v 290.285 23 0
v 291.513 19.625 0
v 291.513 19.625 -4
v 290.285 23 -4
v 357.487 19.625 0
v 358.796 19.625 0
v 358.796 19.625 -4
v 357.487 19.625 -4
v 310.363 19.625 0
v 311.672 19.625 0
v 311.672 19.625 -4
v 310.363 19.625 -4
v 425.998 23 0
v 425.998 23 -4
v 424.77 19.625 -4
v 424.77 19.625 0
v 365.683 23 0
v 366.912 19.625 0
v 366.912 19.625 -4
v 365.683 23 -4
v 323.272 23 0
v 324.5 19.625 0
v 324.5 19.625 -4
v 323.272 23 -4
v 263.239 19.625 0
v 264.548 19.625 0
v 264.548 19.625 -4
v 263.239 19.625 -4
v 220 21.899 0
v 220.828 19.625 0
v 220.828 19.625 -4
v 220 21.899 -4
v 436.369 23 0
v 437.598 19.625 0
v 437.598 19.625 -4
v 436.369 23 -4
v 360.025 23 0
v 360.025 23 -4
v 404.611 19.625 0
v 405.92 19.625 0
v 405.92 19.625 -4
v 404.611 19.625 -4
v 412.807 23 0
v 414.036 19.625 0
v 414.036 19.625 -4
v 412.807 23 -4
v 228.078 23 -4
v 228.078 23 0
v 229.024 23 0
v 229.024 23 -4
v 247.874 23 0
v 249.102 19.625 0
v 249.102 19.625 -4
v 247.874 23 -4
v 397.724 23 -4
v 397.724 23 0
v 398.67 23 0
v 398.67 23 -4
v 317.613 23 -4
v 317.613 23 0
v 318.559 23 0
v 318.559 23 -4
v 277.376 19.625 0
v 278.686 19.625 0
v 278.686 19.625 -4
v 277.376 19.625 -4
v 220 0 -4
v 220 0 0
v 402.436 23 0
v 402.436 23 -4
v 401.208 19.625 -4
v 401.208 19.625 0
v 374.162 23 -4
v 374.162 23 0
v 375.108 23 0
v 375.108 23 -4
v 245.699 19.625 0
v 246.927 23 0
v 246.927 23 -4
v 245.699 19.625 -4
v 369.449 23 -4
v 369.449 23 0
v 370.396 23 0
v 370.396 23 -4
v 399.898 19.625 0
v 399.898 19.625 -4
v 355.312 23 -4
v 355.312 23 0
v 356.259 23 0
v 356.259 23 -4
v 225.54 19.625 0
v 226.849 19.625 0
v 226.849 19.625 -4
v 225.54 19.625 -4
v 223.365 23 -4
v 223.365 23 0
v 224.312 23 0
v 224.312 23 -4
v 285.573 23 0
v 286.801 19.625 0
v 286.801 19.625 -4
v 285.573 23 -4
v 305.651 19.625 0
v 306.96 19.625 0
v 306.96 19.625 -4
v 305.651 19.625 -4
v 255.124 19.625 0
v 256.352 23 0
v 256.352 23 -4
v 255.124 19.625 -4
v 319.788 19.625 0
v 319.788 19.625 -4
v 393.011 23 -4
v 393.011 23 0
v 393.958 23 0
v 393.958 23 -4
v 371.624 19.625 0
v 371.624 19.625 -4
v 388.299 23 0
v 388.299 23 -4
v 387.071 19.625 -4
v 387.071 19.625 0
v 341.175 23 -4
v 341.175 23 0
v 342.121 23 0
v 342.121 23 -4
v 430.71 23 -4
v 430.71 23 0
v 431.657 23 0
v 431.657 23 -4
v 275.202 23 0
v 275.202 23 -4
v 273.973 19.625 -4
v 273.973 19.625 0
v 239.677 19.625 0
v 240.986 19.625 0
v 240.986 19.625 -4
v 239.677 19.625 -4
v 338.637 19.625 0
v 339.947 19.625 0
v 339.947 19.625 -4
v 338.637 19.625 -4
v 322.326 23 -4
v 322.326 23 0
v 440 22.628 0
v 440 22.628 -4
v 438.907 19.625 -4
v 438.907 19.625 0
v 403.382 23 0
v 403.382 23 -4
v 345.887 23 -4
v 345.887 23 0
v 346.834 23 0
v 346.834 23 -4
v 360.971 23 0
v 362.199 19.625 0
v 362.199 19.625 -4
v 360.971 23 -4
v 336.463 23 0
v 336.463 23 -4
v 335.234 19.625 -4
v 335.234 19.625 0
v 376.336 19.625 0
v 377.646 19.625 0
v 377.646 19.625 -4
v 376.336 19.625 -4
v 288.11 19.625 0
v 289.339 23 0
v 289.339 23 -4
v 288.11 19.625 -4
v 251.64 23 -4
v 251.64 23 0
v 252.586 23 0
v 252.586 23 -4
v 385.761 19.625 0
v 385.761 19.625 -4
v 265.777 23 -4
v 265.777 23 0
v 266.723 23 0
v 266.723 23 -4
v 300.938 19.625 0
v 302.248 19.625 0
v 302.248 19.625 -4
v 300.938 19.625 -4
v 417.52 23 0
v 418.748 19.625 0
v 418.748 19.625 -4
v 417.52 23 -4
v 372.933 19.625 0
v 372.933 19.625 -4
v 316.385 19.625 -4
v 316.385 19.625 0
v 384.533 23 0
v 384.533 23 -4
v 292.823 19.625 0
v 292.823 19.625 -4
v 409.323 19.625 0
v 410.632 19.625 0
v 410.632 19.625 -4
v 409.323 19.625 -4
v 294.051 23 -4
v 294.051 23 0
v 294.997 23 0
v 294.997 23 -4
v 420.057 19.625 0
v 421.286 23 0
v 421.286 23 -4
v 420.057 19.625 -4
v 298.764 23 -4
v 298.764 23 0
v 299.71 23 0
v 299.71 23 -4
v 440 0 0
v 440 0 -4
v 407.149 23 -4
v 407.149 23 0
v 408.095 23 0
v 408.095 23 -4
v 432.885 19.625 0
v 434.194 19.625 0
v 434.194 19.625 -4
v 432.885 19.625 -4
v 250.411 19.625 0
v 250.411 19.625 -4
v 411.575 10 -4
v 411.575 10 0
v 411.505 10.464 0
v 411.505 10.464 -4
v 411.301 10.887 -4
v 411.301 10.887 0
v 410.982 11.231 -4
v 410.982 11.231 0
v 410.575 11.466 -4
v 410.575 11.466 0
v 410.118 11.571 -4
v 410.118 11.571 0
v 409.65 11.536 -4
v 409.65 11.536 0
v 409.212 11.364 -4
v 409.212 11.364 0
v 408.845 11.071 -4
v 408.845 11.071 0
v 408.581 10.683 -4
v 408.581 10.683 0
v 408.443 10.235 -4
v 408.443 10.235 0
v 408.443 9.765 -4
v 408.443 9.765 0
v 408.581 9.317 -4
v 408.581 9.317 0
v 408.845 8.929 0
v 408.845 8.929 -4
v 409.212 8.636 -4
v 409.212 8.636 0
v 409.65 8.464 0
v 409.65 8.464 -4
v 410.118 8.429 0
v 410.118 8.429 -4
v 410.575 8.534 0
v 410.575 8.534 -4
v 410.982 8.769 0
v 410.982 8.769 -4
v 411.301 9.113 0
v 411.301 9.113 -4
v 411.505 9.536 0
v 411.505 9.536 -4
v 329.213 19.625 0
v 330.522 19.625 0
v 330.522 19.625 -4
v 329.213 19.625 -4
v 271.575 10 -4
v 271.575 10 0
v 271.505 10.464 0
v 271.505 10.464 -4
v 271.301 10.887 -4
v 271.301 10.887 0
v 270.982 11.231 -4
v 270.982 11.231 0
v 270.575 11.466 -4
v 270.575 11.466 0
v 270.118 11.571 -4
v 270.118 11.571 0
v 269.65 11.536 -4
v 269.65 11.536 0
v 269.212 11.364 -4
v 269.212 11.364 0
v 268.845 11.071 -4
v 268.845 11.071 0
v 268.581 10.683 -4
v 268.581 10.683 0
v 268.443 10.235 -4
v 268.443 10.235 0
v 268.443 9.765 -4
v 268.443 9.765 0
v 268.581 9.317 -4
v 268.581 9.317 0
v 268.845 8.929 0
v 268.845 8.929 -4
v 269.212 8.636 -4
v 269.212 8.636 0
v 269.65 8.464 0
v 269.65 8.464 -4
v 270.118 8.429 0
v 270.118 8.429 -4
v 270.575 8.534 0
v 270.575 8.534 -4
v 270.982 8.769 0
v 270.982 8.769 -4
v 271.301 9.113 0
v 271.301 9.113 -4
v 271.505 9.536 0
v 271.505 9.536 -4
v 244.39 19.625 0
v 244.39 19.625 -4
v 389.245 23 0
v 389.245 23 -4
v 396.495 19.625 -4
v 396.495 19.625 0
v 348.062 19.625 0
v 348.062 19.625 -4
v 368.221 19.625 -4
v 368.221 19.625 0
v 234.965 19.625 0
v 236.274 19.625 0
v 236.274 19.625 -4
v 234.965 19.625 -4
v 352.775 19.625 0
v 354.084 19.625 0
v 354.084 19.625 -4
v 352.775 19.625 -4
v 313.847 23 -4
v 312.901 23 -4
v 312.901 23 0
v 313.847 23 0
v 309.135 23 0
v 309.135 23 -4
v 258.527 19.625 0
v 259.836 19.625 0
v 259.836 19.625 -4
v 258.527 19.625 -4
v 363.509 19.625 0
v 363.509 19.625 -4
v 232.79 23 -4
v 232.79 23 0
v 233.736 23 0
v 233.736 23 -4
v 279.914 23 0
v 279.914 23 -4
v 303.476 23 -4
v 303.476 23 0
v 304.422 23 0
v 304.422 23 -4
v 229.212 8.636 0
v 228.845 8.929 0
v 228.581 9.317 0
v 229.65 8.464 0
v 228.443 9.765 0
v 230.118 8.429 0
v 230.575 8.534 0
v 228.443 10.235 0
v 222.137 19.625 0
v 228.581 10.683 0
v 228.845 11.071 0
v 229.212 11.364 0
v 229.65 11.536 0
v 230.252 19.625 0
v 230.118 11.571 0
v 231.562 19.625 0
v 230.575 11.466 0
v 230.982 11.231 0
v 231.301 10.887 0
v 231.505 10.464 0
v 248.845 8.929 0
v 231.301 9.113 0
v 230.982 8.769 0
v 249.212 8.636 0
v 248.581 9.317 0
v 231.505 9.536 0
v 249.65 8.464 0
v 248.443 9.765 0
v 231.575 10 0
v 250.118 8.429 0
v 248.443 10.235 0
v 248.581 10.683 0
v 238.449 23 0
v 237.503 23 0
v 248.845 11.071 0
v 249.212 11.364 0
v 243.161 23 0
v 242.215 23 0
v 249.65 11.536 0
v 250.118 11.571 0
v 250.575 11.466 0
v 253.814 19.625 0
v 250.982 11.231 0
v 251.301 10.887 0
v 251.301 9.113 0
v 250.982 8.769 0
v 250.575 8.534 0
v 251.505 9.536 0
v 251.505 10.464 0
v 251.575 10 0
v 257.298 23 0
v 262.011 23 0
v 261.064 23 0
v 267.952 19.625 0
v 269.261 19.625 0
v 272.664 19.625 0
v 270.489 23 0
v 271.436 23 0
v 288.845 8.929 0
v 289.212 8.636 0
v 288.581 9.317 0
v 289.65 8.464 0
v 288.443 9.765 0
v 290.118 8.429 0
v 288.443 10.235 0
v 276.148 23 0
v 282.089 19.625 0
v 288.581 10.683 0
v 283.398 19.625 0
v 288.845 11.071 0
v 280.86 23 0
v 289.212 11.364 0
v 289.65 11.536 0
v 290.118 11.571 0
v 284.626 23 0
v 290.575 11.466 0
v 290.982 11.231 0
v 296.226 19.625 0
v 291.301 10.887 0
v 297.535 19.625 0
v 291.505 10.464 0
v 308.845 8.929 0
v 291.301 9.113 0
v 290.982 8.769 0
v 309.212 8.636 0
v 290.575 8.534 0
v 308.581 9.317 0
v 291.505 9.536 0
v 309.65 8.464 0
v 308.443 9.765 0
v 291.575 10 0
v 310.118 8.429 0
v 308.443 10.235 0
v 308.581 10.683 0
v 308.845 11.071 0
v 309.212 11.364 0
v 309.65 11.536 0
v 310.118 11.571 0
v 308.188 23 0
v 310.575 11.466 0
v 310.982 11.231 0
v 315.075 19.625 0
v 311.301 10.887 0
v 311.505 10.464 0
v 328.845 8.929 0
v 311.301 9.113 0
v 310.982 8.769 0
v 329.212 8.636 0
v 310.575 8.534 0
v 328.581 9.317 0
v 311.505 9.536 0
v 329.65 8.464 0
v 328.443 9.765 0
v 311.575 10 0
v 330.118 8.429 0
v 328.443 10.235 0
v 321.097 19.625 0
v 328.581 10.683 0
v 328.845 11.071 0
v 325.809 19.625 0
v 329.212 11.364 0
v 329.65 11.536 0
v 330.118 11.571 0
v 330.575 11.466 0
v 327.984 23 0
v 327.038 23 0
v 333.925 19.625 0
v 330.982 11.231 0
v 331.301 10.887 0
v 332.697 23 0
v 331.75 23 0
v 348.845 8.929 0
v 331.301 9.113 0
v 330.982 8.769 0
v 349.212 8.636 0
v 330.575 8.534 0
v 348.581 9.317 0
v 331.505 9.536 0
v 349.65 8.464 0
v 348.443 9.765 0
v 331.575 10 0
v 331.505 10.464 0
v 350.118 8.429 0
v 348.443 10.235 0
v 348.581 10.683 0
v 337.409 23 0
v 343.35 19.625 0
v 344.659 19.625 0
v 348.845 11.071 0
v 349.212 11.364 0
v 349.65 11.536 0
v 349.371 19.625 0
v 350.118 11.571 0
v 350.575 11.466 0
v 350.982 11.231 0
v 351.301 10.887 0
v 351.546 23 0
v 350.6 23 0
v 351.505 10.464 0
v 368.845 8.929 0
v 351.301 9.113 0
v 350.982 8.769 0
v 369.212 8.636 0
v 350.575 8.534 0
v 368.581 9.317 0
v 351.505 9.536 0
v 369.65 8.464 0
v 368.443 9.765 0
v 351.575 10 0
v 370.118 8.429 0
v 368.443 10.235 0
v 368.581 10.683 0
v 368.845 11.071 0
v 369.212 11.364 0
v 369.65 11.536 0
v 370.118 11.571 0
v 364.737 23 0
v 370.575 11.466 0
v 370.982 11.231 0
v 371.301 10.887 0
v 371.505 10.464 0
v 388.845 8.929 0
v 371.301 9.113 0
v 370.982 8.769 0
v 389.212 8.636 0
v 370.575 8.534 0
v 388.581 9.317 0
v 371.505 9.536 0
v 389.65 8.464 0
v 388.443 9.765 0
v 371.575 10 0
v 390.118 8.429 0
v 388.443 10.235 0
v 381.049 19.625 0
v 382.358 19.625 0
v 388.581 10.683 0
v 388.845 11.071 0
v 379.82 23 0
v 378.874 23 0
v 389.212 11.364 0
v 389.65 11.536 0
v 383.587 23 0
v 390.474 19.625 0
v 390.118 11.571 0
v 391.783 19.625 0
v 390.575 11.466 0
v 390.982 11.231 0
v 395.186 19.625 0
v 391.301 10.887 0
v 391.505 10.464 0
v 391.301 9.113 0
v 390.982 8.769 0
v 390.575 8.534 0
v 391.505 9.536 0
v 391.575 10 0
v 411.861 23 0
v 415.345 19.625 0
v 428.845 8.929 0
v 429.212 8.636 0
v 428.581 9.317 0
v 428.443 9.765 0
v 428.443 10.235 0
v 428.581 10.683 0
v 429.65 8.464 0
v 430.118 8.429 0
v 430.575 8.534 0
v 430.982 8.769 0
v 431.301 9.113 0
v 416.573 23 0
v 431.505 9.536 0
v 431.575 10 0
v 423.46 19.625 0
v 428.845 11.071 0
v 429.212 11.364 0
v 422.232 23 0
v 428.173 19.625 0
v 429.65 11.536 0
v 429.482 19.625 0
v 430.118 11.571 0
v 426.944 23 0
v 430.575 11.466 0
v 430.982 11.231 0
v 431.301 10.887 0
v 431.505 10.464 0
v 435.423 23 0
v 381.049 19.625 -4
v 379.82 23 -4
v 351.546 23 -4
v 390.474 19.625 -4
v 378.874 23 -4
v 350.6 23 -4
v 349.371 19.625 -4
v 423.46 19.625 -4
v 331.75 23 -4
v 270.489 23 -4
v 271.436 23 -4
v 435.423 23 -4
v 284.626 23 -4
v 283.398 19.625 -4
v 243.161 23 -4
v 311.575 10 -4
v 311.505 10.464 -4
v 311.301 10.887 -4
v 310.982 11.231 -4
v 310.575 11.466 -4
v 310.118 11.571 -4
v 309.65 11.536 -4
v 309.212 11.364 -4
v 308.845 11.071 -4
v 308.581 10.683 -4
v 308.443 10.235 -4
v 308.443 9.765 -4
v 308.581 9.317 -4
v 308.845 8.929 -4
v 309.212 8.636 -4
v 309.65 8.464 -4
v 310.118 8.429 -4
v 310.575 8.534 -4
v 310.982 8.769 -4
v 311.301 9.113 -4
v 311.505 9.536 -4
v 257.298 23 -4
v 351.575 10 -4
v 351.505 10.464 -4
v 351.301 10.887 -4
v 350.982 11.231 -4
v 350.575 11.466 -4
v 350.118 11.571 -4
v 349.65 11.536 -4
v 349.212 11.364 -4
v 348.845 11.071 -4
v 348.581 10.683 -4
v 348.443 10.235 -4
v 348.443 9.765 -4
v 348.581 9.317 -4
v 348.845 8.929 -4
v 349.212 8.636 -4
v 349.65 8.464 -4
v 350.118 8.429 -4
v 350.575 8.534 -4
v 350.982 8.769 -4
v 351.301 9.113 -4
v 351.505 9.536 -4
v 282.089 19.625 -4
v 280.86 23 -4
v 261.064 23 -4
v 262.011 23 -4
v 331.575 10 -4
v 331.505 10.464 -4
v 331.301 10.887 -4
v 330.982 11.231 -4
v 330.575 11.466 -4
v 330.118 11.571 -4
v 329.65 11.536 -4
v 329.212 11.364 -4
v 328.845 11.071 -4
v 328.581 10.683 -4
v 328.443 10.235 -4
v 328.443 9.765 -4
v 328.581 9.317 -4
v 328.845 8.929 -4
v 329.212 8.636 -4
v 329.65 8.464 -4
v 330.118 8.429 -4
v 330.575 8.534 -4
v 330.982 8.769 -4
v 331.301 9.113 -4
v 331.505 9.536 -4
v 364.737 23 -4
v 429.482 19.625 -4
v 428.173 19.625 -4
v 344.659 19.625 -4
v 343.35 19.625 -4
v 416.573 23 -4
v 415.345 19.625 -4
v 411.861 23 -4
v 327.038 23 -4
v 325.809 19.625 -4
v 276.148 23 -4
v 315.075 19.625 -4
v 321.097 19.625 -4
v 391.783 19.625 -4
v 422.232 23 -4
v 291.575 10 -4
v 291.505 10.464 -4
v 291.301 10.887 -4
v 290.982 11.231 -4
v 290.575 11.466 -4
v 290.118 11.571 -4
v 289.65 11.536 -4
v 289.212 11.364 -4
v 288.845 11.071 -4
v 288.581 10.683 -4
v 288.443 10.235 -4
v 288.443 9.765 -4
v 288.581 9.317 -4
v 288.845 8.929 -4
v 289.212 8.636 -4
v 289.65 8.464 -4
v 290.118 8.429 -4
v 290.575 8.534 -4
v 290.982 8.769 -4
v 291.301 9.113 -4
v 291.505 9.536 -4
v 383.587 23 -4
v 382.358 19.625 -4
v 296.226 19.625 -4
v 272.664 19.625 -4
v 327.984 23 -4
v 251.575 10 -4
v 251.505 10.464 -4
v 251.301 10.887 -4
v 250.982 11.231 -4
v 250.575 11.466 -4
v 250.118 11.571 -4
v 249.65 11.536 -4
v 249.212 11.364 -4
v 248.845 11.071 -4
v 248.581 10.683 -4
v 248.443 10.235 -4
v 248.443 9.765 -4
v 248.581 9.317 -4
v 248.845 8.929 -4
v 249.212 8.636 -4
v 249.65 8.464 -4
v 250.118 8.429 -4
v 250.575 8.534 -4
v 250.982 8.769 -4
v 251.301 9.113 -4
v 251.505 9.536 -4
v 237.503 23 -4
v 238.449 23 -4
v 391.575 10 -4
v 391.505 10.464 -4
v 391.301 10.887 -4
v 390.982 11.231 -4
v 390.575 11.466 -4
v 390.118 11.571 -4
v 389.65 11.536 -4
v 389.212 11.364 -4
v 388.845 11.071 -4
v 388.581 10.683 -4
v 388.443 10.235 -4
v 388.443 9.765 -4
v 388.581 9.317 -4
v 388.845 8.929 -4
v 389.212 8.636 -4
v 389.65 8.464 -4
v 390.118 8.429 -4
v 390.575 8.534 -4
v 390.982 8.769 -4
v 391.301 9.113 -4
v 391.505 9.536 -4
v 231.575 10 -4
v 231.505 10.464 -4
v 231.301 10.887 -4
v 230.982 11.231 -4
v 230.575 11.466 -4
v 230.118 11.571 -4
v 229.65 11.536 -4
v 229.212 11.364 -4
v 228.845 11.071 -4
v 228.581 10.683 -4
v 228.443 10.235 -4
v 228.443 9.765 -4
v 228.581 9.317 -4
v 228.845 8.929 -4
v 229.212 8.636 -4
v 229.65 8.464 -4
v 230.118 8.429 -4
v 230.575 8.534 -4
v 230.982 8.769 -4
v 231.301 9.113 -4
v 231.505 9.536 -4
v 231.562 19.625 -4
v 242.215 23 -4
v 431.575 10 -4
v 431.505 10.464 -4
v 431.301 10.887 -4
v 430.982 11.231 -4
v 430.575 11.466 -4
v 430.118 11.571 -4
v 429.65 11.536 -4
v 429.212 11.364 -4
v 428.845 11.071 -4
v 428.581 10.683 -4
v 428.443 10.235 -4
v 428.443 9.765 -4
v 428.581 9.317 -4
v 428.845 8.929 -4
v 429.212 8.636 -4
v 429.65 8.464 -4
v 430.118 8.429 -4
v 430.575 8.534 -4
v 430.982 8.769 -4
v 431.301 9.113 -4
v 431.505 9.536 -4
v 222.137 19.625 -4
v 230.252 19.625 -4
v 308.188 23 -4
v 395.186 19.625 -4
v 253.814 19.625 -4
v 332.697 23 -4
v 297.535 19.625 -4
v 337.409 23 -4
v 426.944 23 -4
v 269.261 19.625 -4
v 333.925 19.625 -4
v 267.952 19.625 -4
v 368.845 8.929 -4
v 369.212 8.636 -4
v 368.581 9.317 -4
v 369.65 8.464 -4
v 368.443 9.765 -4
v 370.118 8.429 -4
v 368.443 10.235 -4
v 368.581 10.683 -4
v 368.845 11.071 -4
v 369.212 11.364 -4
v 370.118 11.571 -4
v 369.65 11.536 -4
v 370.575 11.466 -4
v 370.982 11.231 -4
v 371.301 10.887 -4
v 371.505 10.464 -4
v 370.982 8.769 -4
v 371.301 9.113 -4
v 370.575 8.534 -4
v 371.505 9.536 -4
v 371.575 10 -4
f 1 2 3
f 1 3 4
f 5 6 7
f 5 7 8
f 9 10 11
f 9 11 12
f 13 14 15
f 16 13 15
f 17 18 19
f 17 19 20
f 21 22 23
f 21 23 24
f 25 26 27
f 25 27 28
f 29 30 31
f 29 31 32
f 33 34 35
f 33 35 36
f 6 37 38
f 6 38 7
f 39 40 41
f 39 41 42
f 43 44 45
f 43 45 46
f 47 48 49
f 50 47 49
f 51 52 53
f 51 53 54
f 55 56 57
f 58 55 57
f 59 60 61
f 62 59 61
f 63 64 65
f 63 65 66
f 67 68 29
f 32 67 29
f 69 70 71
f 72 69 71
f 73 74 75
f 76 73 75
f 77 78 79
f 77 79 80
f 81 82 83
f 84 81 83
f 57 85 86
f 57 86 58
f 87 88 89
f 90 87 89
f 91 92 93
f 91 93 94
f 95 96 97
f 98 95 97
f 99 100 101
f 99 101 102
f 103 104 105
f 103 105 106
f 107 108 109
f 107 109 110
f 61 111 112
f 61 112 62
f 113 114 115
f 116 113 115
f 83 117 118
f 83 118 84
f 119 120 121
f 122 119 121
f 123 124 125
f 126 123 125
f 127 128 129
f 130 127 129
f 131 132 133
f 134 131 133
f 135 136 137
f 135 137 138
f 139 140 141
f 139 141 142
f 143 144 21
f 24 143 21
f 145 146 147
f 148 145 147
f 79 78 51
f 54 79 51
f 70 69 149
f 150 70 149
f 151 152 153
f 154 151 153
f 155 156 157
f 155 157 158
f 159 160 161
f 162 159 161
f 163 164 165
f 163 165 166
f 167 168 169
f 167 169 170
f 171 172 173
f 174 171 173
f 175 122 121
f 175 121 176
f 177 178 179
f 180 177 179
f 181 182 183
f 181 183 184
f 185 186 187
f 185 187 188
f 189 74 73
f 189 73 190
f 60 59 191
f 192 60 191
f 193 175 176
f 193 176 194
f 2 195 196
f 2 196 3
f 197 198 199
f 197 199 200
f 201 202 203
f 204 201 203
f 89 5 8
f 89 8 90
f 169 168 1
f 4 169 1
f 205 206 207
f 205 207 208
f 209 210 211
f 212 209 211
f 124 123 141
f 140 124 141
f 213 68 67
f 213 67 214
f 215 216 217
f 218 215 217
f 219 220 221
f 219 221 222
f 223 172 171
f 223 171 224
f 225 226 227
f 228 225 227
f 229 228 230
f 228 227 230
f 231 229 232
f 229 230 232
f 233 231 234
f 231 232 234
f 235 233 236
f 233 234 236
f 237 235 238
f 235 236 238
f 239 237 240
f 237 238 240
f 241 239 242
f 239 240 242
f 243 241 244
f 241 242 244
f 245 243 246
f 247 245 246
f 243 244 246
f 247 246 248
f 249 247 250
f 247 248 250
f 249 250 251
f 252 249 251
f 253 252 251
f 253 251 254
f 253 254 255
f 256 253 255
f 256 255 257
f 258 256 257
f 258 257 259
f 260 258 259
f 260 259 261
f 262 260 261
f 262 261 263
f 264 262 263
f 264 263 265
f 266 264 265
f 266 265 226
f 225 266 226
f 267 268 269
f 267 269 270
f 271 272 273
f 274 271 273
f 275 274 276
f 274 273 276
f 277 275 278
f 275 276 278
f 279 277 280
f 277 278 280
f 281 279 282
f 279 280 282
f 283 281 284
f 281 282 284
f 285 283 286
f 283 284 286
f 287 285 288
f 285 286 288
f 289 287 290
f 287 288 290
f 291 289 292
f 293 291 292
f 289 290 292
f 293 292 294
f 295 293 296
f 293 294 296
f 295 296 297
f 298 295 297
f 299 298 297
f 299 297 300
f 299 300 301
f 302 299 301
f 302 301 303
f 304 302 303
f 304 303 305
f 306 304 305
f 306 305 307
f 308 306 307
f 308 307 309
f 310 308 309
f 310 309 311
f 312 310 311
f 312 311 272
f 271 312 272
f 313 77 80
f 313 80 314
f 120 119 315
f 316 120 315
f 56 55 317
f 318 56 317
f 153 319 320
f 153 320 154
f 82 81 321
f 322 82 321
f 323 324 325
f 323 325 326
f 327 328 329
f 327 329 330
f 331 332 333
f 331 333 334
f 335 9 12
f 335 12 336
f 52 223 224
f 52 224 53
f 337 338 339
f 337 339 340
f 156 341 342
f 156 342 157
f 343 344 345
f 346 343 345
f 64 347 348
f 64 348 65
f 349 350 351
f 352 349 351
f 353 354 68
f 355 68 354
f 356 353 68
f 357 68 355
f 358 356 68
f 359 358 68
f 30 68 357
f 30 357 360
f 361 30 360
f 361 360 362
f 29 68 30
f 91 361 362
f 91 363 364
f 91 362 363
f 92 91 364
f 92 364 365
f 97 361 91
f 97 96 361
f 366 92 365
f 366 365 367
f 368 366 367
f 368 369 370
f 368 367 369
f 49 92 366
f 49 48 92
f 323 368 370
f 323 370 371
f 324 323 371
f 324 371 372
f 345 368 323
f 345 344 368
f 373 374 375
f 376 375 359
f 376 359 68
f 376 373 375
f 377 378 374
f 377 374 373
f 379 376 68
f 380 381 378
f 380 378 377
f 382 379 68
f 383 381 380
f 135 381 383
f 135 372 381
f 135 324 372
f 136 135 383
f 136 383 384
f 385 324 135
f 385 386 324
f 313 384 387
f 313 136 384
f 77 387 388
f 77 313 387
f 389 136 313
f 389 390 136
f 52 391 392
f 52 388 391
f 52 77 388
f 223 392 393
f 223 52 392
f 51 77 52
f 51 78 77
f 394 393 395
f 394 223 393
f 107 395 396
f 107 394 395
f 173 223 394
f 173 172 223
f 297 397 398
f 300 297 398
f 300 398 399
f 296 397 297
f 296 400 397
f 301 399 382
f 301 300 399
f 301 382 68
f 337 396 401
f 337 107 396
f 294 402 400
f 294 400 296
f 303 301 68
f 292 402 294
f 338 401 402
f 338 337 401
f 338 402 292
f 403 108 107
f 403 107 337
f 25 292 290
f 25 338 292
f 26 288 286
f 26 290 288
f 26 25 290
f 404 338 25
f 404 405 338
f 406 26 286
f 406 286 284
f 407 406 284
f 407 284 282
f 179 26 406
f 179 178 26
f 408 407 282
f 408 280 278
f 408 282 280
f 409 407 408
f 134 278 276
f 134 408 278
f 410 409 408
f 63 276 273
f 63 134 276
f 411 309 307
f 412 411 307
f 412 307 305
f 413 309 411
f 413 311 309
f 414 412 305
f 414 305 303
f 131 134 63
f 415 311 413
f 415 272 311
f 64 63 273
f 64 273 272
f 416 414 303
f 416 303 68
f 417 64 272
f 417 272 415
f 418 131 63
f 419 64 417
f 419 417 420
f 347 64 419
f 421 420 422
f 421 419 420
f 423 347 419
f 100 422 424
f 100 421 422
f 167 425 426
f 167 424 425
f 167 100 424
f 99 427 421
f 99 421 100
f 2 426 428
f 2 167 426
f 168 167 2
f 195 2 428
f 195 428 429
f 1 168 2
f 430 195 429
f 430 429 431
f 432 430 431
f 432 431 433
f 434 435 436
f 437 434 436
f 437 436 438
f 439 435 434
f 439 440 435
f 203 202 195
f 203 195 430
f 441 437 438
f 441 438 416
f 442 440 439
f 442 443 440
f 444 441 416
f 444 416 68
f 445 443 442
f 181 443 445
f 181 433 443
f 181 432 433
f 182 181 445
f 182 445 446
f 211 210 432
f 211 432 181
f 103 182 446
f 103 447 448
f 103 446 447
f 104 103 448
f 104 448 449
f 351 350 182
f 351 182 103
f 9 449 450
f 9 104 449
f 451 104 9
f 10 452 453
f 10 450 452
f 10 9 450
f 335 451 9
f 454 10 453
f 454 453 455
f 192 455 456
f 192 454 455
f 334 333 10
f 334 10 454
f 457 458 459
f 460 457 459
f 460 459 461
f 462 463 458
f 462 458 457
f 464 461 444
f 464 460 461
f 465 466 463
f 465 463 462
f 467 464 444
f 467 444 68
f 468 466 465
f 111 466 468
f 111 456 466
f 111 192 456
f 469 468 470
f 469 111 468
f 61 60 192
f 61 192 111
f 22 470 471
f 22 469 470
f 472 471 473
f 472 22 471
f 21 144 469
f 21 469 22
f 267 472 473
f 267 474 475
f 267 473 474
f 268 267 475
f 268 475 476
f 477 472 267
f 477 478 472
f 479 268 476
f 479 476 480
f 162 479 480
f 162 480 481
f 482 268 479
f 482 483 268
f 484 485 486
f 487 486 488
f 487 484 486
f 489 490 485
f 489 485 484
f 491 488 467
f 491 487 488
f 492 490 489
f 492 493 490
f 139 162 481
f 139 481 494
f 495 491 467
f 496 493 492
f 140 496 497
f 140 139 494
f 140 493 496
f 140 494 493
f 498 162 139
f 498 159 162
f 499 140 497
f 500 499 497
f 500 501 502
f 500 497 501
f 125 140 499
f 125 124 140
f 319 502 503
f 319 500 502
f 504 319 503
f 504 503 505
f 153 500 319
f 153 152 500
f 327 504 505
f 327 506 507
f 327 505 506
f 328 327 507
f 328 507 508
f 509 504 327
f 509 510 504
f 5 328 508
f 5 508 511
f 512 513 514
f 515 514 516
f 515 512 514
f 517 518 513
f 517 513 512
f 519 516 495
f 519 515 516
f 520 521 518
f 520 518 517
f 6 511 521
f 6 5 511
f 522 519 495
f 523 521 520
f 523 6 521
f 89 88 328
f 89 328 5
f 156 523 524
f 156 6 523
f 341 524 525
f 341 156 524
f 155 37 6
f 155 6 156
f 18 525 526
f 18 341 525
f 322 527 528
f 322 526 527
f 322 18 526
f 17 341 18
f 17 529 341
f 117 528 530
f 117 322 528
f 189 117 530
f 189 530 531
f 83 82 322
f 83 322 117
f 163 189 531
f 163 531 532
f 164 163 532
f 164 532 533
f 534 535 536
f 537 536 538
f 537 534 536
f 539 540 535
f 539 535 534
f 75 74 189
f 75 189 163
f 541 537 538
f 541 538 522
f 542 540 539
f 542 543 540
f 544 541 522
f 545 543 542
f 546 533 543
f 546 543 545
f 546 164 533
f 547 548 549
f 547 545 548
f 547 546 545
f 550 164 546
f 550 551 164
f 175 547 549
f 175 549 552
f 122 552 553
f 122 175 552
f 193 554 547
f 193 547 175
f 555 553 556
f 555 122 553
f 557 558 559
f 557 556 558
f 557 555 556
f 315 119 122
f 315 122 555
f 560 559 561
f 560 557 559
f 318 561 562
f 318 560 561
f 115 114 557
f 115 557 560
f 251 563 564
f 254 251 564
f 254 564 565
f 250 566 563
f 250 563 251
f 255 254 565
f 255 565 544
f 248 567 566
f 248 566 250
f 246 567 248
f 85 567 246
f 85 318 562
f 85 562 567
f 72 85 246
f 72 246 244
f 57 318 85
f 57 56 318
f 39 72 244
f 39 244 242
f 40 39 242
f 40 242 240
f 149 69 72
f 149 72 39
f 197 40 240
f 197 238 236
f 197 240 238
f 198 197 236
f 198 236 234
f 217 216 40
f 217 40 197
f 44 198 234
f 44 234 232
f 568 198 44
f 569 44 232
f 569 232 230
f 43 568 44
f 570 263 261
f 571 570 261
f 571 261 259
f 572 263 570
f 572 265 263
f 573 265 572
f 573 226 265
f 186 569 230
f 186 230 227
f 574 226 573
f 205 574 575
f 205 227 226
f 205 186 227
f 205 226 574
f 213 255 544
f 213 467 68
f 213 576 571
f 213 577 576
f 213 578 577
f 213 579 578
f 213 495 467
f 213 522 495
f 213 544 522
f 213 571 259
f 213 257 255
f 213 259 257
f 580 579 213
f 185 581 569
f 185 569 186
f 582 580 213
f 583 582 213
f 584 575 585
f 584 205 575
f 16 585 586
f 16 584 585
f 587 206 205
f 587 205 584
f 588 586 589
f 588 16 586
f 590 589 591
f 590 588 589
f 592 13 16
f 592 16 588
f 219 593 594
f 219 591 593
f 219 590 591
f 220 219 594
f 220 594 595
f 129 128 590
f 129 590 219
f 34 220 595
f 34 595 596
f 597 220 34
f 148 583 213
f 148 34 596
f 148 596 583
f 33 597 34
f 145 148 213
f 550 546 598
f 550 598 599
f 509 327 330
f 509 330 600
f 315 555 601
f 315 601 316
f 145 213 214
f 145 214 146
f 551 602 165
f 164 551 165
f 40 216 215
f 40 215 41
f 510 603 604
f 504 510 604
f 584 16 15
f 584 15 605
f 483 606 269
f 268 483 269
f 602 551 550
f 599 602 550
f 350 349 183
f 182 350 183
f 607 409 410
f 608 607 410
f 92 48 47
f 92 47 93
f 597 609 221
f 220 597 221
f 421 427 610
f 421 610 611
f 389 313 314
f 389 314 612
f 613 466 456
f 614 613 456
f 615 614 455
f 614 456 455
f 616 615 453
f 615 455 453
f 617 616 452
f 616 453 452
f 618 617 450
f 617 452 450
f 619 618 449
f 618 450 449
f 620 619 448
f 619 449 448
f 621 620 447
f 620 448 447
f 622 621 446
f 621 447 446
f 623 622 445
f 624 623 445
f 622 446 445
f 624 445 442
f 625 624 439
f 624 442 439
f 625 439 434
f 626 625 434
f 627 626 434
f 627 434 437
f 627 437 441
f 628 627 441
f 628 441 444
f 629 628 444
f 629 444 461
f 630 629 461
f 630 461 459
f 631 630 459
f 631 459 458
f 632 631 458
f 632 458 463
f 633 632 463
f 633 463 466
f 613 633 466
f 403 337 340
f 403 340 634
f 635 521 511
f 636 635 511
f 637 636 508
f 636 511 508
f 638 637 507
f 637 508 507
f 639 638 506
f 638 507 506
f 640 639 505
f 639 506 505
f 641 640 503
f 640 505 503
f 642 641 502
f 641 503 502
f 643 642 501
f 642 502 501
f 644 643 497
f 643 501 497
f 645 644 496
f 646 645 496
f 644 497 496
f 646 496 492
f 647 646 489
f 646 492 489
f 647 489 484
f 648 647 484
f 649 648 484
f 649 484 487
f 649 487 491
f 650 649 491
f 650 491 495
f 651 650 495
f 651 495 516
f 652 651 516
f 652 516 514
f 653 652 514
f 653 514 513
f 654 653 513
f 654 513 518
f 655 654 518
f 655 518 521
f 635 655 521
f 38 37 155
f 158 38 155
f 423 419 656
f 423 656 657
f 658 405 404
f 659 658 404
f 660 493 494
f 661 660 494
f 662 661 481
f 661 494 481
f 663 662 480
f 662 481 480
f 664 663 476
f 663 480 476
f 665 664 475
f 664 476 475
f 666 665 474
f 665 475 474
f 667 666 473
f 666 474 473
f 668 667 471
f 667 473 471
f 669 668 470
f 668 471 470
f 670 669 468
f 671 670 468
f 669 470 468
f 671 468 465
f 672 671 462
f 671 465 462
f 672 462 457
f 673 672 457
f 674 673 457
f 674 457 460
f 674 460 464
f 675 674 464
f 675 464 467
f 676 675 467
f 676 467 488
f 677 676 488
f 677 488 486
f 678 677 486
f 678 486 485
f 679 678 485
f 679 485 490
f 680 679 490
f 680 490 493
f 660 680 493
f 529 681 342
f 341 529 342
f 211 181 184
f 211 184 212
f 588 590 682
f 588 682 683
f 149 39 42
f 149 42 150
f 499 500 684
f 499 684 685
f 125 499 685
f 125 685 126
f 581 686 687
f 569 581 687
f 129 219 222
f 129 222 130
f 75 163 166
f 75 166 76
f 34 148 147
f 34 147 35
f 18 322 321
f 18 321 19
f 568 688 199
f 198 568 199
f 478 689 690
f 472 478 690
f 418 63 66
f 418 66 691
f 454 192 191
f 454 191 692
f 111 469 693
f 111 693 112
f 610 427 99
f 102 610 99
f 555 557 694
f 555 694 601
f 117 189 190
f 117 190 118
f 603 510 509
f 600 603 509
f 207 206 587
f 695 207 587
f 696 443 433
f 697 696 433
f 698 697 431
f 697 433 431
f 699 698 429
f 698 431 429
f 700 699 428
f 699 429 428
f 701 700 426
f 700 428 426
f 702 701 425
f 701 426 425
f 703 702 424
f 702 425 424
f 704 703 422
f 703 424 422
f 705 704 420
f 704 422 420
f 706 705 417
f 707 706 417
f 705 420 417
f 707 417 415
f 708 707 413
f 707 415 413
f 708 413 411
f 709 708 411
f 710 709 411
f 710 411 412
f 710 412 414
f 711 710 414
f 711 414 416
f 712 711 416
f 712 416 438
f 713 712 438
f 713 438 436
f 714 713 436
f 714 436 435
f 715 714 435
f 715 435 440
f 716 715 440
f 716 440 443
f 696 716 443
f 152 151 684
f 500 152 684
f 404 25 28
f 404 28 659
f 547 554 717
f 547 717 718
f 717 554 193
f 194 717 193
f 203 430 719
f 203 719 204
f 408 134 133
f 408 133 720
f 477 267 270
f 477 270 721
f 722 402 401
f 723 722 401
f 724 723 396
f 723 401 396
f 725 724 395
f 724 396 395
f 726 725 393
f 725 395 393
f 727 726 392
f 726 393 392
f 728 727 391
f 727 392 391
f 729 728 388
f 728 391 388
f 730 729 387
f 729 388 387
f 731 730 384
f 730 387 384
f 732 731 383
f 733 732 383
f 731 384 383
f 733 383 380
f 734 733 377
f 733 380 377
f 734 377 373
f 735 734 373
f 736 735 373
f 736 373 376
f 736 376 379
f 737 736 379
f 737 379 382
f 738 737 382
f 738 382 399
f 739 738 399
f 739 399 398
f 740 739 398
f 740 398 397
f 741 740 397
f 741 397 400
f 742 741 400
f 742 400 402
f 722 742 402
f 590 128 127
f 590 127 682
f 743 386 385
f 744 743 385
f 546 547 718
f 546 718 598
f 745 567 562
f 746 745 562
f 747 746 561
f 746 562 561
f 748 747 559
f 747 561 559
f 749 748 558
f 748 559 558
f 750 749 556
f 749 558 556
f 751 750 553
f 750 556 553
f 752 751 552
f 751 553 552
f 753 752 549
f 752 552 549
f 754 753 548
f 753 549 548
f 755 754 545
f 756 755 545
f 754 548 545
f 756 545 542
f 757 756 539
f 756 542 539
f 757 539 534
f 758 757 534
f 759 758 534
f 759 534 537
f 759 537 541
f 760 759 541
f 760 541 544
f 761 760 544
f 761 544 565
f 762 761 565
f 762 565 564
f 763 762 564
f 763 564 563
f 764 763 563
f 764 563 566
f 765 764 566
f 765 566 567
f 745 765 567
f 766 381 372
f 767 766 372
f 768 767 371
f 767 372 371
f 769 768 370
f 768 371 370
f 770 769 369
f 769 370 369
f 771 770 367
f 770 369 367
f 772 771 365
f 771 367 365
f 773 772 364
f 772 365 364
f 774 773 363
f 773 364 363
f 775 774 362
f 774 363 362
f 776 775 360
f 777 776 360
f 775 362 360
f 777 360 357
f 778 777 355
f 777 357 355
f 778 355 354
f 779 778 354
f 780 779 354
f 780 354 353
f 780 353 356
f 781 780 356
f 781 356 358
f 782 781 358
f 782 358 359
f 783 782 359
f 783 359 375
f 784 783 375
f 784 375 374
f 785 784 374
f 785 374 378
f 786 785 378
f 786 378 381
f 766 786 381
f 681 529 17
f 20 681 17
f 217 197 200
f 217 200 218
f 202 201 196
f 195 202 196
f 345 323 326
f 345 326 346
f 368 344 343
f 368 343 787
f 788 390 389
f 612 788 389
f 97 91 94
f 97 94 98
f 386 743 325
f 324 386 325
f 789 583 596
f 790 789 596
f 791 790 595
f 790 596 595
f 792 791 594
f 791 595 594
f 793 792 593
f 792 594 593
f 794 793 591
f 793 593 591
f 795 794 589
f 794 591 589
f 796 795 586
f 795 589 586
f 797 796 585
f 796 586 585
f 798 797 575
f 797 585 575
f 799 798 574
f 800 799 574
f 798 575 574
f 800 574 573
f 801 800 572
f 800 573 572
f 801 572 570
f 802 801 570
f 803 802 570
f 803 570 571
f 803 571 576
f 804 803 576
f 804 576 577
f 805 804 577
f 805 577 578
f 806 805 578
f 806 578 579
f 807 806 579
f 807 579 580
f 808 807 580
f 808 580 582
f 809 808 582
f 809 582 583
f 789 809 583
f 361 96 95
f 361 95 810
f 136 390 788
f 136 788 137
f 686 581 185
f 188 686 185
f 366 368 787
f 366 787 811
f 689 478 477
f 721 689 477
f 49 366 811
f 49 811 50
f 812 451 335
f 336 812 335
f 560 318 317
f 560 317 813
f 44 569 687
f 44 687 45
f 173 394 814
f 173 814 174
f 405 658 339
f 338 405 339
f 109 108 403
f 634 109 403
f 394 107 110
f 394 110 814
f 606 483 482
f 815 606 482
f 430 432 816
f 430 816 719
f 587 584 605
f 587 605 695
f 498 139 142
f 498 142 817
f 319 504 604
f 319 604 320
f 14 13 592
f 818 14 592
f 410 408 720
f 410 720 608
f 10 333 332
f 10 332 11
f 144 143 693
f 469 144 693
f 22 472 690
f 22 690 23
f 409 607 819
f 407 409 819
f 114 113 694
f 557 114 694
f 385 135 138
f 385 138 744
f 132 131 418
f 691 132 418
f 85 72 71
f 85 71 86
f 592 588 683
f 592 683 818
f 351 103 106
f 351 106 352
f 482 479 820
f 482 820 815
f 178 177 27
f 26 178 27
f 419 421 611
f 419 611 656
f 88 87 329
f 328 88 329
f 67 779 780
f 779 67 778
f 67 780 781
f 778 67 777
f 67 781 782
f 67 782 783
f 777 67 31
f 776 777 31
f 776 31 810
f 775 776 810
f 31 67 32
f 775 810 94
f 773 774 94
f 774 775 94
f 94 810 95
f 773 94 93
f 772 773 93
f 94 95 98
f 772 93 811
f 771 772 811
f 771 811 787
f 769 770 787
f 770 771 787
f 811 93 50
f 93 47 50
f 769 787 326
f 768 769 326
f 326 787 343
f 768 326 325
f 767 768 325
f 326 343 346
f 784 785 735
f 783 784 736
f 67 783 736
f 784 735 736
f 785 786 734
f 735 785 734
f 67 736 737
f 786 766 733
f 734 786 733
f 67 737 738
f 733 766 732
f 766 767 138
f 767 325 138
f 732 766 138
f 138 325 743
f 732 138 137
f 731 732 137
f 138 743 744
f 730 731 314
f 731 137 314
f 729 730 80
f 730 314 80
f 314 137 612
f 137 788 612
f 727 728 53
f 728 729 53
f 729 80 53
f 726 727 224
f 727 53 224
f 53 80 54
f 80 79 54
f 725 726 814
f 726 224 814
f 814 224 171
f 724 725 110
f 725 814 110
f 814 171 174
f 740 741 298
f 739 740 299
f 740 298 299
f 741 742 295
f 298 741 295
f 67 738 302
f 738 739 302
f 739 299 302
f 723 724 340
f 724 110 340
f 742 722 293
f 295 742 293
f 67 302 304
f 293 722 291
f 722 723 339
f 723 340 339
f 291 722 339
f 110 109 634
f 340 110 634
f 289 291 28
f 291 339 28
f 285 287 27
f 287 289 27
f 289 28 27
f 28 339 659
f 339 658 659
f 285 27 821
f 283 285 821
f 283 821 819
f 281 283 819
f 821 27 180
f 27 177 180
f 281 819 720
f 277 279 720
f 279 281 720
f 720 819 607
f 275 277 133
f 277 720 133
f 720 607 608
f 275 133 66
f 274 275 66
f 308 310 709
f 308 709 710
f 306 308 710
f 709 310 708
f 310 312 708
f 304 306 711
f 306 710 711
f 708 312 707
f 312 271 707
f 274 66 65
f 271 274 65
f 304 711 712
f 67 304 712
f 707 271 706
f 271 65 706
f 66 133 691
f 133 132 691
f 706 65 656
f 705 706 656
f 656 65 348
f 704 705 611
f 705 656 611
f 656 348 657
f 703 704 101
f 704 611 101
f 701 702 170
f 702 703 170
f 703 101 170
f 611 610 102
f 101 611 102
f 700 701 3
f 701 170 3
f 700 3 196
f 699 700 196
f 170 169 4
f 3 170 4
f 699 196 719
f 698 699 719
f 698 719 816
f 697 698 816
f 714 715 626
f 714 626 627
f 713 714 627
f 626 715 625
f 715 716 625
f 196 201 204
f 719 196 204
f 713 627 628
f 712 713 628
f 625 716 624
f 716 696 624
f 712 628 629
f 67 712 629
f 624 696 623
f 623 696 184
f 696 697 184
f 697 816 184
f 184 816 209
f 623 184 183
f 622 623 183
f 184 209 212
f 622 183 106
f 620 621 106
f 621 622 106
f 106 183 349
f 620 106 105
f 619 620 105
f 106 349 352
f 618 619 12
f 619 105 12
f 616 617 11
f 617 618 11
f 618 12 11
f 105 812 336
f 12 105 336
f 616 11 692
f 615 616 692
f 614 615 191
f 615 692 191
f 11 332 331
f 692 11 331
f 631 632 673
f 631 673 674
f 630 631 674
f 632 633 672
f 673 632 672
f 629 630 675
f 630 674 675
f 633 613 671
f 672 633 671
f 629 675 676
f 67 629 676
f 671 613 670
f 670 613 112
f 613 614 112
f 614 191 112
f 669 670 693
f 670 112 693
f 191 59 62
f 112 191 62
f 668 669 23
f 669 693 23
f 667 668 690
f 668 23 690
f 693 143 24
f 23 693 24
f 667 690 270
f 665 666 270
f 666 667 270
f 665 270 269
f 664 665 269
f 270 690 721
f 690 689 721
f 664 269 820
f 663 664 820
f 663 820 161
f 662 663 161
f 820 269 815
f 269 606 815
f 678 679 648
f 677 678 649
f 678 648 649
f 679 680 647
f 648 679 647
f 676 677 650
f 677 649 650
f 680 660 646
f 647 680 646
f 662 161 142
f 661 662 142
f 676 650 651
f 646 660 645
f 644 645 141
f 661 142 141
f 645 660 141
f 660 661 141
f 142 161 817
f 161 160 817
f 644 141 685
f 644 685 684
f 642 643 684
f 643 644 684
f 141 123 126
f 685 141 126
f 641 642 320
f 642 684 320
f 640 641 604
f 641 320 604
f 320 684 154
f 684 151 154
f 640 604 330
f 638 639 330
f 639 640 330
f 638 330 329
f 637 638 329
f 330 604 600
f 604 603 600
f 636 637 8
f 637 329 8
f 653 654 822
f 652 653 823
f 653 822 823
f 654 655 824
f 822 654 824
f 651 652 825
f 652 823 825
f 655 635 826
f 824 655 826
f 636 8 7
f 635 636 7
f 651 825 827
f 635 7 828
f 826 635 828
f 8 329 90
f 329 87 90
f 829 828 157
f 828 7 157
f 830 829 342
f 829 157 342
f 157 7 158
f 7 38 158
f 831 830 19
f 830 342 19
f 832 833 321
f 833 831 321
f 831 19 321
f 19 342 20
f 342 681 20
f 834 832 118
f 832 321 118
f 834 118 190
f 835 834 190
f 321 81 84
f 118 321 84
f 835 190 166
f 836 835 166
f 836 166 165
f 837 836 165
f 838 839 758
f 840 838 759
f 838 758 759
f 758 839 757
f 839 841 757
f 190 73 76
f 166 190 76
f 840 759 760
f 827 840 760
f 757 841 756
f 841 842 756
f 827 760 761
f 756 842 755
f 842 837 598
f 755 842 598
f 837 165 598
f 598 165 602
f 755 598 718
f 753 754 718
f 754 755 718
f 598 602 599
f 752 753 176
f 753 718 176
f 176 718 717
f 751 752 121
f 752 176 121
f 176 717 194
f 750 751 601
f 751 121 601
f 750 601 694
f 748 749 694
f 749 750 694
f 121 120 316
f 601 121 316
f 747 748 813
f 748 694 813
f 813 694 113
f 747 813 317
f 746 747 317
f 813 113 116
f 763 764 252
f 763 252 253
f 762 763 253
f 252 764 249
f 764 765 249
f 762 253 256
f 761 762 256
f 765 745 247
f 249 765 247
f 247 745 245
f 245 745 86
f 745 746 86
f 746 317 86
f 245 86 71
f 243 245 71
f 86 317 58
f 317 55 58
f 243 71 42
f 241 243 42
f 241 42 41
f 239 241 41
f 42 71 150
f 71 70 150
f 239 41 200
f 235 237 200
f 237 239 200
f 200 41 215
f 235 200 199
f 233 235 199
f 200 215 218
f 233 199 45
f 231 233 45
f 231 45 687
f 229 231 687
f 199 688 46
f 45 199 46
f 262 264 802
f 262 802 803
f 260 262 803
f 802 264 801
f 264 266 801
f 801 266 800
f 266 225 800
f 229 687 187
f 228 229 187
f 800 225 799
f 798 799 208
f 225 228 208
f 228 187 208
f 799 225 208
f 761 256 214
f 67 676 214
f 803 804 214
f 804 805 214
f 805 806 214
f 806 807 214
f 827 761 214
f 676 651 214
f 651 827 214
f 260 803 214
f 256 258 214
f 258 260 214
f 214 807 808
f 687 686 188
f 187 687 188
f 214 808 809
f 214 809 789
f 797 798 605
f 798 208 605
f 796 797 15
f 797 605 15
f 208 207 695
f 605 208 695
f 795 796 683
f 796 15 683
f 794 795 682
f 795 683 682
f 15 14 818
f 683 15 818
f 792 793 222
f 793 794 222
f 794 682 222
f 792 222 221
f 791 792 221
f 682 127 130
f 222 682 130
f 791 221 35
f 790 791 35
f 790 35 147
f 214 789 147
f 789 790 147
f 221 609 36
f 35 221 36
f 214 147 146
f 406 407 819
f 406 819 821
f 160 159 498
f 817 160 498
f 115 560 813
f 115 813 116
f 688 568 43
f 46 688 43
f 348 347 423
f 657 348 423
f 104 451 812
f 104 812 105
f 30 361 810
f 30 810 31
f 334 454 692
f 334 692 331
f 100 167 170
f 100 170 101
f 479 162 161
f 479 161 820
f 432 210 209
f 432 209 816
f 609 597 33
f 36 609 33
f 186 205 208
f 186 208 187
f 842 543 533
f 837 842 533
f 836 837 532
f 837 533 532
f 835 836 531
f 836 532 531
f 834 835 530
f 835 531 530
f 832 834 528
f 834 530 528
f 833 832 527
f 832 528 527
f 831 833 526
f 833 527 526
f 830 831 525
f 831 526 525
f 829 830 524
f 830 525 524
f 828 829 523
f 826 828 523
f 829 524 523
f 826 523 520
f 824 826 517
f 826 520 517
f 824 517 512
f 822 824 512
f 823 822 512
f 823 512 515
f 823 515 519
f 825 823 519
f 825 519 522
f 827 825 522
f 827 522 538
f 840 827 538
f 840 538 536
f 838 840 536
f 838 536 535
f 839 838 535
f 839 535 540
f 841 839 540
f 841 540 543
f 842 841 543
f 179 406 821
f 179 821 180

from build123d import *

# Parameters (mm, degrees)
BLANKSKE_W          = 660
BLANKSKE_H          = 23
BLANK_DEPTH         = 4
TOOTHCUTSIM_DEPTH   = 661.412749726
TEETHCUTS_COUNT     = 141
TEETHCUTS_PITCH     = 4.712388975
SKETCH_2_R          = 1.575
CUT_EXTRUDE_2_DEPTH = 661.412749726
SKETCH_3_W          = 220
SKETCH_3_H          = 92.024953344
SKETCH_3_H_2        = 80.466347601
CUT_EXTRUDE_3_DEPTH = 661.412749726


with BuildPart() as part:
    # BlankSke → Blank (new body)
    with BuildSketch(Plane.XY):
        with Locations((330, 11.5)):
            Rectangle(BLANKSKE_W, BLANKSKE_H)
    extrude(amount=-BLANK_DEPTH)

    # TooCutSkeSim → ToothCutSim (cut, through all)
    with BuildSketch(Plane.XY):
        Polygon((0.654653055, 19.625), (-0.654653055, 19.625), (-1.892297439, 23.0254), (1.892297439, 23.0254), align=None)
    toothcutsim = extrude(amount=-TOOTHCUTSIM_DEPTH, mode=Mode.SUBTRACT)

    # TeethCuts: ToothCutSim ×141
    with Locations(*[(i * TEETHCUTS_PITCH, 0, 0) for i in range(1, TEETHCUTS_COUNT)]):
        add(toothcutsim, mode=Mode.SUBTRACT)

    # 草图2 → 切除-拉伸2 (cut, through all)
    with BuildSketch(Plane.XY):
        with Locations((650, 10)):
            Circle(SKETCH_2_R)
        with Locations((630, 10)):
            Circle(SKETCH_2_R)
        with Locations((610, 10)):
            Circle(SKETCH_2_R)
        with Locations((590, 10)):
            Circle(SKETCH_2_R)
        with Locations((570, 10)):
            Circle(SKETCH_2_R)
        with Locations((550, 10)):
            Circle(SKETCH_2_R)
        with Locations((530, 10)):
            Circle(SKETCH_2_R)
        with Locations((510, 10)):
            Circle(SKETCH_2_R)
        with Locations((490, 10)):
            Circle(SKETCH_2_R)
        with Locations((470, 10)):
            Circle(SKETCH_2_R)
        with Locations((450, 10)):
            Circle(SKETCH_2_R)
        with Locations((430, 10)):
            Circle(SKETCH_2_R)
        with Locations((410, 10)):
            Circle(SKETCH_2_R)
        with Locations((390, 10)):
            Circle(SKETCH_2_R)
        with Locations((370, 10)):
            Circle(SKETCH_2_R)
        with Locations((350, 10)):
            Circle(SKETCH_2_R)
        with Locations((330, 10)):
            Circle(SKETCH_2_R)
        with Locations((310, 10)):
            Circle(SKETCH_2_R)
        with Locations((290, 10)):
            Circle(SKETCH_2_R)
        with Locations((270, 10)):
            Circle(SKETCH_2_R)
        with Locations((250, 10)):
            Circle(SKETCH_2_R)
        with Locations((230, 10)):
            Circle(SKETCH_2_R)
        with Locations((210, 10)):
            Circle(SKETCH_2_R)
        with Locations((190, 10)):
            Circle(SKETCH_2_R)
        with Locations((170, 10)):
            Circle(SKETCH_2_R)
        with Locations((150, 10)):
            Circle(SKETCH_2_R)
        with Locations((130, 10)):
            Circle(SKETCH_2_R)
        with Locations((110, 10)):
            Circle(SKETCH_2_R)
        with Locations((90, 10)):
            Circle(SKETCH_2_R)
        with Locations((70, 10)):
            Circle(SKETCH_2_R)
        with Locations((50, 10)):
            Circle(SKETCH_2_R)
        with Locations((30, 10)):
            Circle(SKETCH_2_R)
        with Locations((10, 10)):
            Circle(SKETCH_2_R)
    extrude(amount=-CUT_EXTRUDE_2_DEPTH, mode=Mode.SUBTRACT)

    # 草图3 → 切除-拉伸3 (cut, through all)
    with BuildSketch(Plane.XY):
        with Locations((110, 46.012476672)):
            Rectangle(SKETCH_3_W, SKETCH_3_H)
        with Locations((550, 40.233173801)):
            Rectangle(SKETCH_3_W, SKETCH_3_H_2)
    extrude(amount=-CUT_EXTRUDE_3_DEPTH, mode=Mode.SUBTRACT)


solid = part.part
